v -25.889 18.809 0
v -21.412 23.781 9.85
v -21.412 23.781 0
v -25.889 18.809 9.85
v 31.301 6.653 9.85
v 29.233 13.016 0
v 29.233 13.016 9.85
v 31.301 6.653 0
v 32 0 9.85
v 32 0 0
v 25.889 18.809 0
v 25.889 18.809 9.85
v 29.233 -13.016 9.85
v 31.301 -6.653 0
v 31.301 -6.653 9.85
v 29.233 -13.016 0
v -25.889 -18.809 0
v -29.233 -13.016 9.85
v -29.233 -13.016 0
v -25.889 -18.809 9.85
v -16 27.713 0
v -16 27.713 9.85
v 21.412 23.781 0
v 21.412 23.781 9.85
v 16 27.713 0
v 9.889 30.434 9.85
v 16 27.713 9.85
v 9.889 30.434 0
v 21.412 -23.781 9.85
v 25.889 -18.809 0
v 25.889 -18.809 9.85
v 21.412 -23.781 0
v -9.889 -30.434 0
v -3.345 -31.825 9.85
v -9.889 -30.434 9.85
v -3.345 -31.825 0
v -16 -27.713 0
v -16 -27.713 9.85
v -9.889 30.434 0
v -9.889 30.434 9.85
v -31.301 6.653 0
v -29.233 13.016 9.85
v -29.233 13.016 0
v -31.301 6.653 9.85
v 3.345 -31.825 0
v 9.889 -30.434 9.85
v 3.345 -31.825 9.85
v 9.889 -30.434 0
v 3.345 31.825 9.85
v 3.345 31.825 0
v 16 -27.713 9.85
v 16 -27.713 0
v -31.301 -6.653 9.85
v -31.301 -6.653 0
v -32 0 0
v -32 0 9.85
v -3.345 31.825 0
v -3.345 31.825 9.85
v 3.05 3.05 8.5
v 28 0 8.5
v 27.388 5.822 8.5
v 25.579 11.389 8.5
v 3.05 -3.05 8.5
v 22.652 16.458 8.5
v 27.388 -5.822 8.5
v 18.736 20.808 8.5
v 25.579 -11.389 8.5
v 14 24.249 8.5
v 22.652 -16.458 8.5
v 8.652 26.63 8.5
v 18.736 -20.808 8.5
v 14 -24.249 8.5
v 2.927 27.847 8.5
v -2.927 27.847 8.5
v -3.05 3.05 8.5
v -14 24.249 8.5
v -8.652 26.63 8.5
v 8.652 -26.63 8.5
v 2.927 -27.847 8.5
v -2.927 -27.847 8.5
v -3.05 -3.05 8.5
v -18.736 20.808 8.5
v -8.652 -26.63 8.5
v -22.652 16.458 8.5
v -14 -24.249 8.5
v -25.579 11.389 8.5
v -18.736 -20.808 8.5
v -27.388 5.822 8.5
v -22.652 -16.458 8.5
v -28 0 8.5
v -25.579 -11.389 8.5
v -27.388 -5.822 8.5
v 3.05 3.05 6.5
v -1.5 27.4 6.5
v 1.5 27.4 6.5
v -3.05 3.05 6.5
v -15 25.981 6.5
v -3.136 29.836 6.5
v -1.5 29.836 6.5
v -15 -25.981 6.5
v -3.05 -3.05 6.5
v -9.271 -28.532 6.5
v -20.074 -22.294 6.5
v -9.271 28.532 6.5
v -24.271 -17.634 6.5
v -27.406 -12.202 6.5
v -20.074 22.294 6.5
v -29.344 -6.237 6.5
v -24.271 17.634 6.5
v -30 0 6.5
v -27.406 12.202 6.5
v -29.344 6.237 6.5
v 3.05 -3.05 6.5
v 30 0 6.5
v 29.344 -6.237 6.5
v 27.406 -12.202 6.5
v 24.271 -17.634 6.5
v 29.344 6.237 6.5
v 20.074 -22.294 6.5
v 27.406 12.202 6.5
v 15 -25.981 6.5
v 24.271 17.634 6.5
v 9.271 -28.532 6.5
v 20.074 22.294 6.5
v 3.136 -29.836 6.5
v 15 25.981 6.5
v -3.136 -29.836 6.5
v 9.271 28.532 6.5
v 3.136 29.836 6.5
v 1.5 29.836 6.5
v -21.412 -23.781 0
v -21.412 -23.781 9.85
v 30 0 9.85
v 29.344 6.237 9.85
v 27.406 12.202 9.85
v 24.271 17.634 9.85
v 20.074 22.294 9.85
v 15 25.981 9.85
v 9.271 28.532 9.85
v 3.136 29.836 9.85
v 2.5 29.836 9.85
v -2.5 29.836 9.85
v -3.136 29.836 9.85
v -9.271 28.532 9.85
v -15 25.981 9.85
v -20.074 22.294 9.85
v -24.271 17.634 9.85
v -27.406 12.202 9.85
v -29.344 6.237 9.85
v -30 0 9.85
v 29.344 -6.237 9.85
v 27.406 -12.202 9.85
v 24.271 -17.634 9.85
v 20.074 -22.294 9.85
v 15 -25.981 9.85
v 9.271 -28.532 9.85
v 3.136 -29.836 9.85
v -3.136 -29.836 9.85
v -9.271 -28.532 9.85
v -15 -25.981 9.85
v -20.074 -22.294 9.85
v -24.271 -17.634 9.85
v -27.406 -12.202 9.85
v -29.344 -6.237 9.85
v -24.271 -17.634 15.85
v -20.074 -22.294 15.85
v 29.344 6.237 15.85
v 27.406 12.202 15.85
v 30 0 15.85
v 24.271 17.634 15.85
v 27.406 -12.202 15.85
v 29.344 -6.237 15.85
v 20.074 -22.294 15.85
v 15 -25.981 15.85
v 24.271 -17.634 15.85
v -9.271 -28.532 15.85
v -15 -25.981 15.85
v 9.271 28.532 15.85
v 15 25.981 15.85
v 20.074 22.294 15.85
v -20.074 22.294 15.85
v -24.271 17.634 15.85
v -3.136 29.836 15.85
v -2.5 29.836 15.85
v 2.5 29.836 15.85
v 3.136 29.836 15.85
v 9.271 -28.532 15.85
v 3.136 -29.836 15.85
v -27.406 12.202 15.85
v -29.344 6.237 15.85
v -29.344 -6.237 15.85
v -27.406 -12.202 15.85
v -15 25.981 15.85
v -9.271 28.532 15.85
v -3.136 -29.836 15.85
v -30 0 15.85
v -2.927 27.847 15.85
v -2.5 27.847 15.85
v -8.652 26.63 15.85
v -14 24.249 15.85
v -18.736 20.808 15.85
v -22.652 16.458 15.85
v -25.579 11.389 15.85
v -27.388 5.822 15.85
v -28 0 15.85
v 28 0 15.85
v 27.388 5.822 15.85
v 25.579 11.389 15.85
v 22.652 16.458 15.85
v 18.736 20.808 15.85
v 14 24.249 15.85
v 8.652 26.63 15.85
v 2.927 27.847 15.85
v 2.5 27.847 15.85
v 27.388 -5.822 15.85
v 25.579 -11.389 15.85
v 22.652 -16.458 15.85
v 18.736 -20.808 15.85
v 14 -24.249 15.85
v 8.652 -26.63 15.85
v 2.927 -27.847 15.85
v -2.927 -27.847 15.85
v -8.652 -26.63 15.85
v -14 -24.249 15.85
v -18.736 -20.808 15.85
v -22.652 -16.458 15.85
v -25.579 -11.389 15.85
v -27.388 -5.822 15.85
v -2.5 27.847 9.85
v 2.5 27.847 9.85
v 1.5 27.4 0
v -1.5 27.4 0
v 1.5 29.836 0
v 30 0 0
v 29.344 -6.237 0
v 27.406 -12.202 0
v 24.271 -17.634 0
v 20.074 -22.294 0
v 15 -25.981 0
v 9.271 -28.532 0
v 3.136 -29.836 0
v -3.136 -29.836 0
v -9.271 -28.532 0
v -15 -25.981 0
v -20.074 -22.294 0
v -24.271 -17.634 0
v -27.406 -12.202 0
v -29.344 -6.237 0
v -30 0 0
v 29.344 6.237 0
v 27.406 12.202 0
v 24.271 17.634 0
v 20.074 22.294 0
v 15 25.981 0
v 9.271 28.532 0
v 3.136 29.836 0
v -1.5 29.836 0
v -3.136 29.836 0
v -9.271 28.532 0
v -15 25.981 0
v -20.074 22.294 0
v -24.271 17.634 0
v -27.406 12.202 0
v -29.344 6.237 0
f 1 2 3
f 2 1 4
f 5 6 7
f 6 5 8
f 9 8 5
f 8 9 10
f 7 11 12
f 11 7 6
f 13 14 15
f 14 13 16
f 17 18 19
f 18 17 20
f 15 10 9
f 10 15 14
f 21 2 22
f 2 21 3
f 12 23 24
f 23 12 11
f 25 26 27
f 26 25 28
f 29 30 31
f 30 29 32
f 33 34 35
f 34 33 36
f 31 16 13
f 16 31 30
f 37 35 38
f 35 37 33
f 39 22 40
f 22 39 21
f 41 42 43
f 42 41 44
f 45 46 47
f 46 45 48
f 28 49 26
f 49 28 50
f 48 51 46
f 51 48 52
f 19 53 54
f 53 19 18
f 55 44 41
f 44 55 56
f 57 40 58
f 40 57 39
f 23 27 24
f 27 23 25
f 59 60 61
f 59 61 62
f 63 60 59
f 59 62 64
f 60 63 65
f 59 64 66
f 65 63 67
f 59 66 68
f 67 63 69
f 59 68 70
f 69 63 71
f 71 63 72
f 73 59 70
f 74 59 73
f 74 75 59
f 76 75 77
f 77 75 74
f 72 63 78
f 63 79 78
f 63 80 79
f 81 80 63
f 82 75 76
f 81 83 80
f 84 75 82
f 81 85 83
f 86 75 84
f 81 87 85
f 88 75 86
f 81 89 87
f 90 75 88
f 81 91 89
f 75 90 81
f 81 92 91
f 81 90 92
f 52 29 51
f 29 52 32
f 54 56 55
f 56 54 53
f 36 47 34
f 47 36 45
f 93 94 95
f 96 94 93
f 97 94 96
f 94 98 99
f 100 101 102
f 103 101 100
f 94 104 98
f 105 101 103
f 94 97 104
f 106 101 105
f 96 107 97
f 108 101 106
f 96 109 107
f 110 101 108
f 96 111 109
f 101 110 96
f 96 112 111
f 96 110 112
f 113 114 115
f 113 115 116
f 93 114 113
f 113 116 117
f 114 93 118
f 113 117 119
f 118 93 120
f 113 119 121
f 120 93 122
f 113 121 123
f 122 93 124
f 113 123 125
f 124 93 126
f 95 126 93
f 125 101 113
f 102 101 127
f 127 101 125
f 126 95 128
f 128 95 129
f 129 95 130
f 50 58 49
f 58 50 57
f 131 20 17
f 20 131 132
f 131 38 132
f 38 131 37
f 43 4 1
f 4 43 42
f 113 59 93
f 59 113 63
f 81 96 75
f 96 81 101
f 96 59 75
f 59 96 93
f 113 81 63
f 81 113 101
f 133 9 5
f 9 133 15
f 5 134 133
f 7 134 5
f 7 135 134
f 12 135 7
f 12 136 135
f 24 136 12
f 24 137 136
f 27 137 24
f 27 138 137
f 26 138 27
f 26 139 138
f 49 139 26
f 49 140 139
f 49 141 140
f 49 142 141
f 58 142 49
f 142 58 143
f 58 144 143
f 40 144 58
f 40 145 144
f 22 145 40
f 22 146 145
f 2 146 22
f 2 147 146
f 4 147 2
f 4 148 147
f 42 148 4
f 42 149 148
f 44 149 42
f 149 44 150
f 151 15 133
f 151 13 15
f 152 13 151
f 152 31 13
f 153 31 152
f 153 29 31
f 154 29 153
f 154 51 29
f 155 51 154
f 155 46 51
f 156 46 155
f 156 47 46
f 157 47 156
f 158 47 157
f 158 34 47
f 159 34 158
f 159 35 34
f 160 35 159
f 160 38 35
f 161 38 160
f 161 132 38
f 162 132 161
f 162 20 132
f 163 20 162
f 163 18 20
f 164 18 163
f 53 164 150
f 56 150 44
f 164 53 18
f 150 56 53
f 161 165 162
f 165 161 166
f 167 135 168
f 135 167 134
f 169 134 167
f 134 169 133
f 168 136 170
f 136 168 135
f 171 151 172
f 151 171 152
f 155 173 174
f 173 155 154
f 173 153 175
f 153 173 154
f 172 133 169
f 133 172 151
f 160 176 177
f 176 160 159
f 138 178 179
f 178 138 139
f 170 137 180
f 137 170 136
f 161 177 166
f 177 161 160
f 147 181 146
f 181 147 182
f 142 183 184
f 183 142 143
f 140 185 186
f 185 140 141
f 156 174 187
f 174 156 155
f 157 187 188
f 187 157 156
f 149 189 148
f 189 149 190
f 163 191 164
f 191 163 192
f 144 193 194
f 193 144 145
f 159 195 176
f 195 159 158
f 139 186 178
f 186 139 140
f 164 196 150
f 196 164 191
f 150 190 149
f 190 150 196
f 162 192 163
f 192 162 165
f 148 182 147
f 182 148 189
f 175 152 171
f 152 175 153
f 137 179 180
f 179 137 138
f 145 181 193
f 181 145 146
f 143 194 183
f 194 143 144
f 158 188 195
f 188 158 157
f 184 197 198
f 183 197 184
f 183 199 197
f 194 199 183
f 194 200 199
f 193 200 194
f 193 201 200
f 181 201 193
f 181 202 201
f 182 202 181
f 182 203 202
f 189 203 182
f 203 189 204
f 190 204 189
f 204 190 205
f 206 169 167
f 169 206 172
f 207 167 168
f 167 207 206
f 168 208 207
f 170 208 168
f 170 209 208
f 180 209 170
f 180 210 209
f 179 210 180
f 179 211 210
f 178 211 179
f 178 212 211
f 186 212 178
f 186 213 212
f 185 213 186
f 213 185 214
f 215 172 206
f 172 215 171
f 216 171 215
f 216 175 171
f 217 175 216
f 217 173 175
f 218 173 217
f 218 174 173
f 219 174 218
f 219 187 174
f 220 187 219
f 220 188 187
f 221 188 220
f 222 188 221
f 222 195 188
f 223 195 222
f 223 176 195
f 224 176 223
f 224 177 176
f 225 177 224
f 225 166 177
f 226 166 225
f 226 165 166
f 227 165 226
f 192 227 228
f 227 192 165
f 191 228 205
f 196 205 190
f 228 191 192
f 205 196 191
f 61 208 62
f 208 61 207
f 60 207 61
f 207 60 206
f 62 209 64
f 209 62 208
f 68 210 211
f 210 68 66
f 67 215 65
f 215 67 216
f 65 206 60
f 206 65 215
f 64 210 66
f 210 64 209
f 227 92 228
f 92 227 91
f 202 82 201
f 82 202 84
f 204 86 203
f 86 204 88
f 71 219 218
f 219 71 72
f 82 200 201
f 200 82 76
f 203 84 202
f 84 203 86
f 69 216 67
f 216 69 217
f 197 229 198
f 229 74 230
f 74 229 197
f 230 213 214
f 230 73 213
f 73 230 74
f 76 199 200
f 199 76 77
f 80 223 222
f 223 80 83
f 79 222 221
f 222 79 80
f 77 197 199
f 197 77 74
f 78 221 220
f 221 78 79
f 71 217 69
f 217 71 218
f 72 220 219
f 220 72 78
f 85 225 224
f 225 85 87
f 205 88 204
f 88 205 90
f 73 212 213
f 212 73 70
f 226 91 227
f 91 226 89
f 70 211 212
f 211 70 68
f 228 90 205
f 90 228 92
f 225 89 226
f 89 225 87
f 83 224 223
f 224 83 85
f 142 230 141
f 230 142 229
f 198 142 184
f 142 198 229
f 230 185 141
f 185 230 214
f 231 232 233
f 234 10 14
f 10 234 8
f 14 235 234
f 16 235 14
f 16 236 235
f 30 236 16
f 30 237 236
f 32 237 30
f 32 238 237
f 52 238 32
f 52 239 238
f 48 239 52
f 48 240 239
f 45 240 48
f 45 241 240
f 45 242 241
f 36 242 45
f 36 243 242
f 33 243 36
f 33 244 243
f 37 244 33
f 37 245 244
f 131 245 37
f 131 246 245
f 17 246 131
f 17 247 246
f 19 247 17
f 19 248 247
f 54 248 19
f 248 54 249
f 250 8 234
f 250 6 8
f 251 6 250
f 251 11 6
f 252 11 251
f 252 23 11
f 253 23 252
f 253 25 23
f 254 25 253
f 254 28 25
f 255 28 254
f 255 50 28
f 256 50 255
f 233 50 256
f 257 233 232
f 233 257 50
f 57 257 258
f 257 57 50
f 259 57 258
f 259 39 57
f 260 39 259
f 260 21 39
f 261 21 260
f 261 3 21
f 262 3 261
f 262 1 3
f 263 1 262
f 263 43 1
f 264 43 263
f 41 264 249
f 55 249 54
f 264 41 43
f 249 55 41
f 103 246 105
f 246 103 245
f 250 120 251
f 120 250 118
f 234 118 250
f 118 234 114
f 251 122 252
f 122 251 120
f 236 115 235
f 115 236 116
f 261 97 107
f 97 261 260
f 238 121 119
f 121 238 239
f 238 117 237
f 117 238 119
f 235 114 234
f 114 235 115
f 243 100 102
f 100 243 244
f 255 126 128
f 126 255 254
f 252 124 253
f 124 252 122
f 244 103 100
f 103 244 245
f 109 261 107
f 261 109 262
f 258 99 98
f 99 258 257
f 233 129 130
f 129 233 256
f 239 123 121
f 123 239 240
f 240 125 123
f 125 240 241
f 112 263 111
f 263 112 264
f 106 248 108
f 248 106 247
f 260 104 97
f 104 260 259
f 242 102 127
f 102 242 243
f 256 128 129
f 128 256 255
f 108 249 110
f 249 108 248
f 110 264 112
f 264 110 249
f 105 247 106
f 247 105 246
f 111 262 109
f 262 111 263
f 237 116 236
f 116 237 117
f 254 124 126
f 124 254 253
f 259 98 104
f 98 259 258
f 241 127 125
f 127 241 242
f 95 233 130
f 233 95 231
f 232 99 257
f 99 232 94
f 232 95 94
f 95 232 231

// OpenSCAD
// file: settingsLenghts.scad
//Ancho de la pared
pared  = 2;
//Radio del centro hueco
radioC = 11;
//Alto de la capa de apertura
aperH = 5.5;
//Ancho de la apertura
aperW = 5+1.1;//Ancho mas holgura
//Ancho del lente macro
macroW = 9.3;
//Profundidad del macro
macroH = 3;
//Profundidad parte de atras y delante
profDelante = 6;
profAtras = 6;
//Ceja entre uniones de cilindros
cejaH = 6;
guiaParedW = 2;
tmpHolg = 1.8;


//Correcc

//
//CÁMARA
camP = 3;//Grueso de la pared del presente modelo
camW = 105;//Ancho de la cámara
camH = 61;//Alto de la cámara
camD = 23.5;//Profundidad de la cámara
camHlg = 6;//Holgura que se deja para los tornillos
camLW = 57/2;//Radio del exterior del lente
torW  = 2;//Radio

//
//Ancho de tubo principal (grande)
mcW = 32;//radio
mcH = 28;

//Dimensiones del difractador
diffW = 51;//Alto y Ancho
diffD=1;//Profundidad del difractador
diffWinW=36;//Ancho de la ventana de difracción
diffWinH=24;//Alto de la ventana de difracción

//
//Adquisición de luz
luzHBig = 10; //donde va el tornillo
luzWBig = 28; //27:diametro donde va el tornillo
luzHBigT = 4; //alto del tornillo
luzWBigT = 6; //6: ancho del tornillo
luzHRosca = 7; //donde va la rosca
luzWRosca = 23; //22:diametro de donde va la rosca



//Cuadro guia para que no se mueva
guiaH = cejaH;
guiaW = 3;



module creaPared(h){
	difference(){
		//Pone el cilindro principal
		cylinder(r=mcW,h);

		//Le quita el contorno exterior
		translate([0,0,-0.1])
		cylinder(r=mcW-pared,h+0.2);
	}
}
module creaGuiaTornilloCentrada(){
	translate([-luzWBigT/2,-luzWBigT/2,0])
	cube([luzWBigT,luzWBigT,luzHBig-1+0.2]);
}
module creaGuiaTornilloCentradaArea(){
	tmpW = luzWBigT + pared;
	tmpH = luzHBig  + pared;
	translate([-tmpW/2,-tmpW/2,0])
	cube([tmpW,tmpW,tmpH]);
}
module creaGuia(h){
	//Pone el circulo soporte
	difference(){
		cylinder(r=mcW,h);
		translate([0,0,-0.1])
		cylinder(r=mcW-pared,h+0.2);
	}
	//Pone la guia1
	translate([0,mcW-pared-(guiaW/2)+0.4,0])
	creaGuiaCentrada(h);
}
module creaGuiaHembra(h){
	//Pone el circulo soporte
	tmpW = mcW-guiaW;	
	creaPared(sopH);
	sopH = 1.35;
	
	//Pone la pared de la guia
	difference(){
		cylinder(r=(mcW-pared),sopH+h);
		translate([0,0,-0.1])
		cylinder(r=(mcW-pared-guiaParedW),sopH+h+0.2);
		//Pone la guia
		translate([-(guiaW/3),tmpW,sopH])
		creaGuiaCentrada(sopH+h+0.2);
		translate([(guiaW/3),tmpW,sopH])
		creaGuiaCentrada(sopH+h+0.2);
	}
}
module creaGuiaCentrada(h){
	translate([-guiaW/2,-guiaW/2,0])
	cube([guiaW,guiaW,h]);
}
// main file
include <settingsLenghts.scad>


/////////////////////////////////////

// Cuanto se deja entre la tapa auxiliar y la planta alta
tmpHolg = 0.5;//Con 0 funcionó forzadito

//Pone la apertura
translate([0,0,cejaH+tmpHolg])
creaCilApertura();

//Pone la guia hembra
translate([0,0,cejaH+pared+tmpHolg])
creaGuiaHembra(cejaH);

//Pone guia macho
creaGuia(cejaH+tmpHolg);





module creaCilApertura(){
	difference(){
		//Pone el cilindro principal
		cylinder(r=mcW,pared);

		//Le quita la apertura
		translate([-aperW/2,-aperW/2,-0.1])
		cube([aperW,aperW,pared+0.2]);
	}
}
